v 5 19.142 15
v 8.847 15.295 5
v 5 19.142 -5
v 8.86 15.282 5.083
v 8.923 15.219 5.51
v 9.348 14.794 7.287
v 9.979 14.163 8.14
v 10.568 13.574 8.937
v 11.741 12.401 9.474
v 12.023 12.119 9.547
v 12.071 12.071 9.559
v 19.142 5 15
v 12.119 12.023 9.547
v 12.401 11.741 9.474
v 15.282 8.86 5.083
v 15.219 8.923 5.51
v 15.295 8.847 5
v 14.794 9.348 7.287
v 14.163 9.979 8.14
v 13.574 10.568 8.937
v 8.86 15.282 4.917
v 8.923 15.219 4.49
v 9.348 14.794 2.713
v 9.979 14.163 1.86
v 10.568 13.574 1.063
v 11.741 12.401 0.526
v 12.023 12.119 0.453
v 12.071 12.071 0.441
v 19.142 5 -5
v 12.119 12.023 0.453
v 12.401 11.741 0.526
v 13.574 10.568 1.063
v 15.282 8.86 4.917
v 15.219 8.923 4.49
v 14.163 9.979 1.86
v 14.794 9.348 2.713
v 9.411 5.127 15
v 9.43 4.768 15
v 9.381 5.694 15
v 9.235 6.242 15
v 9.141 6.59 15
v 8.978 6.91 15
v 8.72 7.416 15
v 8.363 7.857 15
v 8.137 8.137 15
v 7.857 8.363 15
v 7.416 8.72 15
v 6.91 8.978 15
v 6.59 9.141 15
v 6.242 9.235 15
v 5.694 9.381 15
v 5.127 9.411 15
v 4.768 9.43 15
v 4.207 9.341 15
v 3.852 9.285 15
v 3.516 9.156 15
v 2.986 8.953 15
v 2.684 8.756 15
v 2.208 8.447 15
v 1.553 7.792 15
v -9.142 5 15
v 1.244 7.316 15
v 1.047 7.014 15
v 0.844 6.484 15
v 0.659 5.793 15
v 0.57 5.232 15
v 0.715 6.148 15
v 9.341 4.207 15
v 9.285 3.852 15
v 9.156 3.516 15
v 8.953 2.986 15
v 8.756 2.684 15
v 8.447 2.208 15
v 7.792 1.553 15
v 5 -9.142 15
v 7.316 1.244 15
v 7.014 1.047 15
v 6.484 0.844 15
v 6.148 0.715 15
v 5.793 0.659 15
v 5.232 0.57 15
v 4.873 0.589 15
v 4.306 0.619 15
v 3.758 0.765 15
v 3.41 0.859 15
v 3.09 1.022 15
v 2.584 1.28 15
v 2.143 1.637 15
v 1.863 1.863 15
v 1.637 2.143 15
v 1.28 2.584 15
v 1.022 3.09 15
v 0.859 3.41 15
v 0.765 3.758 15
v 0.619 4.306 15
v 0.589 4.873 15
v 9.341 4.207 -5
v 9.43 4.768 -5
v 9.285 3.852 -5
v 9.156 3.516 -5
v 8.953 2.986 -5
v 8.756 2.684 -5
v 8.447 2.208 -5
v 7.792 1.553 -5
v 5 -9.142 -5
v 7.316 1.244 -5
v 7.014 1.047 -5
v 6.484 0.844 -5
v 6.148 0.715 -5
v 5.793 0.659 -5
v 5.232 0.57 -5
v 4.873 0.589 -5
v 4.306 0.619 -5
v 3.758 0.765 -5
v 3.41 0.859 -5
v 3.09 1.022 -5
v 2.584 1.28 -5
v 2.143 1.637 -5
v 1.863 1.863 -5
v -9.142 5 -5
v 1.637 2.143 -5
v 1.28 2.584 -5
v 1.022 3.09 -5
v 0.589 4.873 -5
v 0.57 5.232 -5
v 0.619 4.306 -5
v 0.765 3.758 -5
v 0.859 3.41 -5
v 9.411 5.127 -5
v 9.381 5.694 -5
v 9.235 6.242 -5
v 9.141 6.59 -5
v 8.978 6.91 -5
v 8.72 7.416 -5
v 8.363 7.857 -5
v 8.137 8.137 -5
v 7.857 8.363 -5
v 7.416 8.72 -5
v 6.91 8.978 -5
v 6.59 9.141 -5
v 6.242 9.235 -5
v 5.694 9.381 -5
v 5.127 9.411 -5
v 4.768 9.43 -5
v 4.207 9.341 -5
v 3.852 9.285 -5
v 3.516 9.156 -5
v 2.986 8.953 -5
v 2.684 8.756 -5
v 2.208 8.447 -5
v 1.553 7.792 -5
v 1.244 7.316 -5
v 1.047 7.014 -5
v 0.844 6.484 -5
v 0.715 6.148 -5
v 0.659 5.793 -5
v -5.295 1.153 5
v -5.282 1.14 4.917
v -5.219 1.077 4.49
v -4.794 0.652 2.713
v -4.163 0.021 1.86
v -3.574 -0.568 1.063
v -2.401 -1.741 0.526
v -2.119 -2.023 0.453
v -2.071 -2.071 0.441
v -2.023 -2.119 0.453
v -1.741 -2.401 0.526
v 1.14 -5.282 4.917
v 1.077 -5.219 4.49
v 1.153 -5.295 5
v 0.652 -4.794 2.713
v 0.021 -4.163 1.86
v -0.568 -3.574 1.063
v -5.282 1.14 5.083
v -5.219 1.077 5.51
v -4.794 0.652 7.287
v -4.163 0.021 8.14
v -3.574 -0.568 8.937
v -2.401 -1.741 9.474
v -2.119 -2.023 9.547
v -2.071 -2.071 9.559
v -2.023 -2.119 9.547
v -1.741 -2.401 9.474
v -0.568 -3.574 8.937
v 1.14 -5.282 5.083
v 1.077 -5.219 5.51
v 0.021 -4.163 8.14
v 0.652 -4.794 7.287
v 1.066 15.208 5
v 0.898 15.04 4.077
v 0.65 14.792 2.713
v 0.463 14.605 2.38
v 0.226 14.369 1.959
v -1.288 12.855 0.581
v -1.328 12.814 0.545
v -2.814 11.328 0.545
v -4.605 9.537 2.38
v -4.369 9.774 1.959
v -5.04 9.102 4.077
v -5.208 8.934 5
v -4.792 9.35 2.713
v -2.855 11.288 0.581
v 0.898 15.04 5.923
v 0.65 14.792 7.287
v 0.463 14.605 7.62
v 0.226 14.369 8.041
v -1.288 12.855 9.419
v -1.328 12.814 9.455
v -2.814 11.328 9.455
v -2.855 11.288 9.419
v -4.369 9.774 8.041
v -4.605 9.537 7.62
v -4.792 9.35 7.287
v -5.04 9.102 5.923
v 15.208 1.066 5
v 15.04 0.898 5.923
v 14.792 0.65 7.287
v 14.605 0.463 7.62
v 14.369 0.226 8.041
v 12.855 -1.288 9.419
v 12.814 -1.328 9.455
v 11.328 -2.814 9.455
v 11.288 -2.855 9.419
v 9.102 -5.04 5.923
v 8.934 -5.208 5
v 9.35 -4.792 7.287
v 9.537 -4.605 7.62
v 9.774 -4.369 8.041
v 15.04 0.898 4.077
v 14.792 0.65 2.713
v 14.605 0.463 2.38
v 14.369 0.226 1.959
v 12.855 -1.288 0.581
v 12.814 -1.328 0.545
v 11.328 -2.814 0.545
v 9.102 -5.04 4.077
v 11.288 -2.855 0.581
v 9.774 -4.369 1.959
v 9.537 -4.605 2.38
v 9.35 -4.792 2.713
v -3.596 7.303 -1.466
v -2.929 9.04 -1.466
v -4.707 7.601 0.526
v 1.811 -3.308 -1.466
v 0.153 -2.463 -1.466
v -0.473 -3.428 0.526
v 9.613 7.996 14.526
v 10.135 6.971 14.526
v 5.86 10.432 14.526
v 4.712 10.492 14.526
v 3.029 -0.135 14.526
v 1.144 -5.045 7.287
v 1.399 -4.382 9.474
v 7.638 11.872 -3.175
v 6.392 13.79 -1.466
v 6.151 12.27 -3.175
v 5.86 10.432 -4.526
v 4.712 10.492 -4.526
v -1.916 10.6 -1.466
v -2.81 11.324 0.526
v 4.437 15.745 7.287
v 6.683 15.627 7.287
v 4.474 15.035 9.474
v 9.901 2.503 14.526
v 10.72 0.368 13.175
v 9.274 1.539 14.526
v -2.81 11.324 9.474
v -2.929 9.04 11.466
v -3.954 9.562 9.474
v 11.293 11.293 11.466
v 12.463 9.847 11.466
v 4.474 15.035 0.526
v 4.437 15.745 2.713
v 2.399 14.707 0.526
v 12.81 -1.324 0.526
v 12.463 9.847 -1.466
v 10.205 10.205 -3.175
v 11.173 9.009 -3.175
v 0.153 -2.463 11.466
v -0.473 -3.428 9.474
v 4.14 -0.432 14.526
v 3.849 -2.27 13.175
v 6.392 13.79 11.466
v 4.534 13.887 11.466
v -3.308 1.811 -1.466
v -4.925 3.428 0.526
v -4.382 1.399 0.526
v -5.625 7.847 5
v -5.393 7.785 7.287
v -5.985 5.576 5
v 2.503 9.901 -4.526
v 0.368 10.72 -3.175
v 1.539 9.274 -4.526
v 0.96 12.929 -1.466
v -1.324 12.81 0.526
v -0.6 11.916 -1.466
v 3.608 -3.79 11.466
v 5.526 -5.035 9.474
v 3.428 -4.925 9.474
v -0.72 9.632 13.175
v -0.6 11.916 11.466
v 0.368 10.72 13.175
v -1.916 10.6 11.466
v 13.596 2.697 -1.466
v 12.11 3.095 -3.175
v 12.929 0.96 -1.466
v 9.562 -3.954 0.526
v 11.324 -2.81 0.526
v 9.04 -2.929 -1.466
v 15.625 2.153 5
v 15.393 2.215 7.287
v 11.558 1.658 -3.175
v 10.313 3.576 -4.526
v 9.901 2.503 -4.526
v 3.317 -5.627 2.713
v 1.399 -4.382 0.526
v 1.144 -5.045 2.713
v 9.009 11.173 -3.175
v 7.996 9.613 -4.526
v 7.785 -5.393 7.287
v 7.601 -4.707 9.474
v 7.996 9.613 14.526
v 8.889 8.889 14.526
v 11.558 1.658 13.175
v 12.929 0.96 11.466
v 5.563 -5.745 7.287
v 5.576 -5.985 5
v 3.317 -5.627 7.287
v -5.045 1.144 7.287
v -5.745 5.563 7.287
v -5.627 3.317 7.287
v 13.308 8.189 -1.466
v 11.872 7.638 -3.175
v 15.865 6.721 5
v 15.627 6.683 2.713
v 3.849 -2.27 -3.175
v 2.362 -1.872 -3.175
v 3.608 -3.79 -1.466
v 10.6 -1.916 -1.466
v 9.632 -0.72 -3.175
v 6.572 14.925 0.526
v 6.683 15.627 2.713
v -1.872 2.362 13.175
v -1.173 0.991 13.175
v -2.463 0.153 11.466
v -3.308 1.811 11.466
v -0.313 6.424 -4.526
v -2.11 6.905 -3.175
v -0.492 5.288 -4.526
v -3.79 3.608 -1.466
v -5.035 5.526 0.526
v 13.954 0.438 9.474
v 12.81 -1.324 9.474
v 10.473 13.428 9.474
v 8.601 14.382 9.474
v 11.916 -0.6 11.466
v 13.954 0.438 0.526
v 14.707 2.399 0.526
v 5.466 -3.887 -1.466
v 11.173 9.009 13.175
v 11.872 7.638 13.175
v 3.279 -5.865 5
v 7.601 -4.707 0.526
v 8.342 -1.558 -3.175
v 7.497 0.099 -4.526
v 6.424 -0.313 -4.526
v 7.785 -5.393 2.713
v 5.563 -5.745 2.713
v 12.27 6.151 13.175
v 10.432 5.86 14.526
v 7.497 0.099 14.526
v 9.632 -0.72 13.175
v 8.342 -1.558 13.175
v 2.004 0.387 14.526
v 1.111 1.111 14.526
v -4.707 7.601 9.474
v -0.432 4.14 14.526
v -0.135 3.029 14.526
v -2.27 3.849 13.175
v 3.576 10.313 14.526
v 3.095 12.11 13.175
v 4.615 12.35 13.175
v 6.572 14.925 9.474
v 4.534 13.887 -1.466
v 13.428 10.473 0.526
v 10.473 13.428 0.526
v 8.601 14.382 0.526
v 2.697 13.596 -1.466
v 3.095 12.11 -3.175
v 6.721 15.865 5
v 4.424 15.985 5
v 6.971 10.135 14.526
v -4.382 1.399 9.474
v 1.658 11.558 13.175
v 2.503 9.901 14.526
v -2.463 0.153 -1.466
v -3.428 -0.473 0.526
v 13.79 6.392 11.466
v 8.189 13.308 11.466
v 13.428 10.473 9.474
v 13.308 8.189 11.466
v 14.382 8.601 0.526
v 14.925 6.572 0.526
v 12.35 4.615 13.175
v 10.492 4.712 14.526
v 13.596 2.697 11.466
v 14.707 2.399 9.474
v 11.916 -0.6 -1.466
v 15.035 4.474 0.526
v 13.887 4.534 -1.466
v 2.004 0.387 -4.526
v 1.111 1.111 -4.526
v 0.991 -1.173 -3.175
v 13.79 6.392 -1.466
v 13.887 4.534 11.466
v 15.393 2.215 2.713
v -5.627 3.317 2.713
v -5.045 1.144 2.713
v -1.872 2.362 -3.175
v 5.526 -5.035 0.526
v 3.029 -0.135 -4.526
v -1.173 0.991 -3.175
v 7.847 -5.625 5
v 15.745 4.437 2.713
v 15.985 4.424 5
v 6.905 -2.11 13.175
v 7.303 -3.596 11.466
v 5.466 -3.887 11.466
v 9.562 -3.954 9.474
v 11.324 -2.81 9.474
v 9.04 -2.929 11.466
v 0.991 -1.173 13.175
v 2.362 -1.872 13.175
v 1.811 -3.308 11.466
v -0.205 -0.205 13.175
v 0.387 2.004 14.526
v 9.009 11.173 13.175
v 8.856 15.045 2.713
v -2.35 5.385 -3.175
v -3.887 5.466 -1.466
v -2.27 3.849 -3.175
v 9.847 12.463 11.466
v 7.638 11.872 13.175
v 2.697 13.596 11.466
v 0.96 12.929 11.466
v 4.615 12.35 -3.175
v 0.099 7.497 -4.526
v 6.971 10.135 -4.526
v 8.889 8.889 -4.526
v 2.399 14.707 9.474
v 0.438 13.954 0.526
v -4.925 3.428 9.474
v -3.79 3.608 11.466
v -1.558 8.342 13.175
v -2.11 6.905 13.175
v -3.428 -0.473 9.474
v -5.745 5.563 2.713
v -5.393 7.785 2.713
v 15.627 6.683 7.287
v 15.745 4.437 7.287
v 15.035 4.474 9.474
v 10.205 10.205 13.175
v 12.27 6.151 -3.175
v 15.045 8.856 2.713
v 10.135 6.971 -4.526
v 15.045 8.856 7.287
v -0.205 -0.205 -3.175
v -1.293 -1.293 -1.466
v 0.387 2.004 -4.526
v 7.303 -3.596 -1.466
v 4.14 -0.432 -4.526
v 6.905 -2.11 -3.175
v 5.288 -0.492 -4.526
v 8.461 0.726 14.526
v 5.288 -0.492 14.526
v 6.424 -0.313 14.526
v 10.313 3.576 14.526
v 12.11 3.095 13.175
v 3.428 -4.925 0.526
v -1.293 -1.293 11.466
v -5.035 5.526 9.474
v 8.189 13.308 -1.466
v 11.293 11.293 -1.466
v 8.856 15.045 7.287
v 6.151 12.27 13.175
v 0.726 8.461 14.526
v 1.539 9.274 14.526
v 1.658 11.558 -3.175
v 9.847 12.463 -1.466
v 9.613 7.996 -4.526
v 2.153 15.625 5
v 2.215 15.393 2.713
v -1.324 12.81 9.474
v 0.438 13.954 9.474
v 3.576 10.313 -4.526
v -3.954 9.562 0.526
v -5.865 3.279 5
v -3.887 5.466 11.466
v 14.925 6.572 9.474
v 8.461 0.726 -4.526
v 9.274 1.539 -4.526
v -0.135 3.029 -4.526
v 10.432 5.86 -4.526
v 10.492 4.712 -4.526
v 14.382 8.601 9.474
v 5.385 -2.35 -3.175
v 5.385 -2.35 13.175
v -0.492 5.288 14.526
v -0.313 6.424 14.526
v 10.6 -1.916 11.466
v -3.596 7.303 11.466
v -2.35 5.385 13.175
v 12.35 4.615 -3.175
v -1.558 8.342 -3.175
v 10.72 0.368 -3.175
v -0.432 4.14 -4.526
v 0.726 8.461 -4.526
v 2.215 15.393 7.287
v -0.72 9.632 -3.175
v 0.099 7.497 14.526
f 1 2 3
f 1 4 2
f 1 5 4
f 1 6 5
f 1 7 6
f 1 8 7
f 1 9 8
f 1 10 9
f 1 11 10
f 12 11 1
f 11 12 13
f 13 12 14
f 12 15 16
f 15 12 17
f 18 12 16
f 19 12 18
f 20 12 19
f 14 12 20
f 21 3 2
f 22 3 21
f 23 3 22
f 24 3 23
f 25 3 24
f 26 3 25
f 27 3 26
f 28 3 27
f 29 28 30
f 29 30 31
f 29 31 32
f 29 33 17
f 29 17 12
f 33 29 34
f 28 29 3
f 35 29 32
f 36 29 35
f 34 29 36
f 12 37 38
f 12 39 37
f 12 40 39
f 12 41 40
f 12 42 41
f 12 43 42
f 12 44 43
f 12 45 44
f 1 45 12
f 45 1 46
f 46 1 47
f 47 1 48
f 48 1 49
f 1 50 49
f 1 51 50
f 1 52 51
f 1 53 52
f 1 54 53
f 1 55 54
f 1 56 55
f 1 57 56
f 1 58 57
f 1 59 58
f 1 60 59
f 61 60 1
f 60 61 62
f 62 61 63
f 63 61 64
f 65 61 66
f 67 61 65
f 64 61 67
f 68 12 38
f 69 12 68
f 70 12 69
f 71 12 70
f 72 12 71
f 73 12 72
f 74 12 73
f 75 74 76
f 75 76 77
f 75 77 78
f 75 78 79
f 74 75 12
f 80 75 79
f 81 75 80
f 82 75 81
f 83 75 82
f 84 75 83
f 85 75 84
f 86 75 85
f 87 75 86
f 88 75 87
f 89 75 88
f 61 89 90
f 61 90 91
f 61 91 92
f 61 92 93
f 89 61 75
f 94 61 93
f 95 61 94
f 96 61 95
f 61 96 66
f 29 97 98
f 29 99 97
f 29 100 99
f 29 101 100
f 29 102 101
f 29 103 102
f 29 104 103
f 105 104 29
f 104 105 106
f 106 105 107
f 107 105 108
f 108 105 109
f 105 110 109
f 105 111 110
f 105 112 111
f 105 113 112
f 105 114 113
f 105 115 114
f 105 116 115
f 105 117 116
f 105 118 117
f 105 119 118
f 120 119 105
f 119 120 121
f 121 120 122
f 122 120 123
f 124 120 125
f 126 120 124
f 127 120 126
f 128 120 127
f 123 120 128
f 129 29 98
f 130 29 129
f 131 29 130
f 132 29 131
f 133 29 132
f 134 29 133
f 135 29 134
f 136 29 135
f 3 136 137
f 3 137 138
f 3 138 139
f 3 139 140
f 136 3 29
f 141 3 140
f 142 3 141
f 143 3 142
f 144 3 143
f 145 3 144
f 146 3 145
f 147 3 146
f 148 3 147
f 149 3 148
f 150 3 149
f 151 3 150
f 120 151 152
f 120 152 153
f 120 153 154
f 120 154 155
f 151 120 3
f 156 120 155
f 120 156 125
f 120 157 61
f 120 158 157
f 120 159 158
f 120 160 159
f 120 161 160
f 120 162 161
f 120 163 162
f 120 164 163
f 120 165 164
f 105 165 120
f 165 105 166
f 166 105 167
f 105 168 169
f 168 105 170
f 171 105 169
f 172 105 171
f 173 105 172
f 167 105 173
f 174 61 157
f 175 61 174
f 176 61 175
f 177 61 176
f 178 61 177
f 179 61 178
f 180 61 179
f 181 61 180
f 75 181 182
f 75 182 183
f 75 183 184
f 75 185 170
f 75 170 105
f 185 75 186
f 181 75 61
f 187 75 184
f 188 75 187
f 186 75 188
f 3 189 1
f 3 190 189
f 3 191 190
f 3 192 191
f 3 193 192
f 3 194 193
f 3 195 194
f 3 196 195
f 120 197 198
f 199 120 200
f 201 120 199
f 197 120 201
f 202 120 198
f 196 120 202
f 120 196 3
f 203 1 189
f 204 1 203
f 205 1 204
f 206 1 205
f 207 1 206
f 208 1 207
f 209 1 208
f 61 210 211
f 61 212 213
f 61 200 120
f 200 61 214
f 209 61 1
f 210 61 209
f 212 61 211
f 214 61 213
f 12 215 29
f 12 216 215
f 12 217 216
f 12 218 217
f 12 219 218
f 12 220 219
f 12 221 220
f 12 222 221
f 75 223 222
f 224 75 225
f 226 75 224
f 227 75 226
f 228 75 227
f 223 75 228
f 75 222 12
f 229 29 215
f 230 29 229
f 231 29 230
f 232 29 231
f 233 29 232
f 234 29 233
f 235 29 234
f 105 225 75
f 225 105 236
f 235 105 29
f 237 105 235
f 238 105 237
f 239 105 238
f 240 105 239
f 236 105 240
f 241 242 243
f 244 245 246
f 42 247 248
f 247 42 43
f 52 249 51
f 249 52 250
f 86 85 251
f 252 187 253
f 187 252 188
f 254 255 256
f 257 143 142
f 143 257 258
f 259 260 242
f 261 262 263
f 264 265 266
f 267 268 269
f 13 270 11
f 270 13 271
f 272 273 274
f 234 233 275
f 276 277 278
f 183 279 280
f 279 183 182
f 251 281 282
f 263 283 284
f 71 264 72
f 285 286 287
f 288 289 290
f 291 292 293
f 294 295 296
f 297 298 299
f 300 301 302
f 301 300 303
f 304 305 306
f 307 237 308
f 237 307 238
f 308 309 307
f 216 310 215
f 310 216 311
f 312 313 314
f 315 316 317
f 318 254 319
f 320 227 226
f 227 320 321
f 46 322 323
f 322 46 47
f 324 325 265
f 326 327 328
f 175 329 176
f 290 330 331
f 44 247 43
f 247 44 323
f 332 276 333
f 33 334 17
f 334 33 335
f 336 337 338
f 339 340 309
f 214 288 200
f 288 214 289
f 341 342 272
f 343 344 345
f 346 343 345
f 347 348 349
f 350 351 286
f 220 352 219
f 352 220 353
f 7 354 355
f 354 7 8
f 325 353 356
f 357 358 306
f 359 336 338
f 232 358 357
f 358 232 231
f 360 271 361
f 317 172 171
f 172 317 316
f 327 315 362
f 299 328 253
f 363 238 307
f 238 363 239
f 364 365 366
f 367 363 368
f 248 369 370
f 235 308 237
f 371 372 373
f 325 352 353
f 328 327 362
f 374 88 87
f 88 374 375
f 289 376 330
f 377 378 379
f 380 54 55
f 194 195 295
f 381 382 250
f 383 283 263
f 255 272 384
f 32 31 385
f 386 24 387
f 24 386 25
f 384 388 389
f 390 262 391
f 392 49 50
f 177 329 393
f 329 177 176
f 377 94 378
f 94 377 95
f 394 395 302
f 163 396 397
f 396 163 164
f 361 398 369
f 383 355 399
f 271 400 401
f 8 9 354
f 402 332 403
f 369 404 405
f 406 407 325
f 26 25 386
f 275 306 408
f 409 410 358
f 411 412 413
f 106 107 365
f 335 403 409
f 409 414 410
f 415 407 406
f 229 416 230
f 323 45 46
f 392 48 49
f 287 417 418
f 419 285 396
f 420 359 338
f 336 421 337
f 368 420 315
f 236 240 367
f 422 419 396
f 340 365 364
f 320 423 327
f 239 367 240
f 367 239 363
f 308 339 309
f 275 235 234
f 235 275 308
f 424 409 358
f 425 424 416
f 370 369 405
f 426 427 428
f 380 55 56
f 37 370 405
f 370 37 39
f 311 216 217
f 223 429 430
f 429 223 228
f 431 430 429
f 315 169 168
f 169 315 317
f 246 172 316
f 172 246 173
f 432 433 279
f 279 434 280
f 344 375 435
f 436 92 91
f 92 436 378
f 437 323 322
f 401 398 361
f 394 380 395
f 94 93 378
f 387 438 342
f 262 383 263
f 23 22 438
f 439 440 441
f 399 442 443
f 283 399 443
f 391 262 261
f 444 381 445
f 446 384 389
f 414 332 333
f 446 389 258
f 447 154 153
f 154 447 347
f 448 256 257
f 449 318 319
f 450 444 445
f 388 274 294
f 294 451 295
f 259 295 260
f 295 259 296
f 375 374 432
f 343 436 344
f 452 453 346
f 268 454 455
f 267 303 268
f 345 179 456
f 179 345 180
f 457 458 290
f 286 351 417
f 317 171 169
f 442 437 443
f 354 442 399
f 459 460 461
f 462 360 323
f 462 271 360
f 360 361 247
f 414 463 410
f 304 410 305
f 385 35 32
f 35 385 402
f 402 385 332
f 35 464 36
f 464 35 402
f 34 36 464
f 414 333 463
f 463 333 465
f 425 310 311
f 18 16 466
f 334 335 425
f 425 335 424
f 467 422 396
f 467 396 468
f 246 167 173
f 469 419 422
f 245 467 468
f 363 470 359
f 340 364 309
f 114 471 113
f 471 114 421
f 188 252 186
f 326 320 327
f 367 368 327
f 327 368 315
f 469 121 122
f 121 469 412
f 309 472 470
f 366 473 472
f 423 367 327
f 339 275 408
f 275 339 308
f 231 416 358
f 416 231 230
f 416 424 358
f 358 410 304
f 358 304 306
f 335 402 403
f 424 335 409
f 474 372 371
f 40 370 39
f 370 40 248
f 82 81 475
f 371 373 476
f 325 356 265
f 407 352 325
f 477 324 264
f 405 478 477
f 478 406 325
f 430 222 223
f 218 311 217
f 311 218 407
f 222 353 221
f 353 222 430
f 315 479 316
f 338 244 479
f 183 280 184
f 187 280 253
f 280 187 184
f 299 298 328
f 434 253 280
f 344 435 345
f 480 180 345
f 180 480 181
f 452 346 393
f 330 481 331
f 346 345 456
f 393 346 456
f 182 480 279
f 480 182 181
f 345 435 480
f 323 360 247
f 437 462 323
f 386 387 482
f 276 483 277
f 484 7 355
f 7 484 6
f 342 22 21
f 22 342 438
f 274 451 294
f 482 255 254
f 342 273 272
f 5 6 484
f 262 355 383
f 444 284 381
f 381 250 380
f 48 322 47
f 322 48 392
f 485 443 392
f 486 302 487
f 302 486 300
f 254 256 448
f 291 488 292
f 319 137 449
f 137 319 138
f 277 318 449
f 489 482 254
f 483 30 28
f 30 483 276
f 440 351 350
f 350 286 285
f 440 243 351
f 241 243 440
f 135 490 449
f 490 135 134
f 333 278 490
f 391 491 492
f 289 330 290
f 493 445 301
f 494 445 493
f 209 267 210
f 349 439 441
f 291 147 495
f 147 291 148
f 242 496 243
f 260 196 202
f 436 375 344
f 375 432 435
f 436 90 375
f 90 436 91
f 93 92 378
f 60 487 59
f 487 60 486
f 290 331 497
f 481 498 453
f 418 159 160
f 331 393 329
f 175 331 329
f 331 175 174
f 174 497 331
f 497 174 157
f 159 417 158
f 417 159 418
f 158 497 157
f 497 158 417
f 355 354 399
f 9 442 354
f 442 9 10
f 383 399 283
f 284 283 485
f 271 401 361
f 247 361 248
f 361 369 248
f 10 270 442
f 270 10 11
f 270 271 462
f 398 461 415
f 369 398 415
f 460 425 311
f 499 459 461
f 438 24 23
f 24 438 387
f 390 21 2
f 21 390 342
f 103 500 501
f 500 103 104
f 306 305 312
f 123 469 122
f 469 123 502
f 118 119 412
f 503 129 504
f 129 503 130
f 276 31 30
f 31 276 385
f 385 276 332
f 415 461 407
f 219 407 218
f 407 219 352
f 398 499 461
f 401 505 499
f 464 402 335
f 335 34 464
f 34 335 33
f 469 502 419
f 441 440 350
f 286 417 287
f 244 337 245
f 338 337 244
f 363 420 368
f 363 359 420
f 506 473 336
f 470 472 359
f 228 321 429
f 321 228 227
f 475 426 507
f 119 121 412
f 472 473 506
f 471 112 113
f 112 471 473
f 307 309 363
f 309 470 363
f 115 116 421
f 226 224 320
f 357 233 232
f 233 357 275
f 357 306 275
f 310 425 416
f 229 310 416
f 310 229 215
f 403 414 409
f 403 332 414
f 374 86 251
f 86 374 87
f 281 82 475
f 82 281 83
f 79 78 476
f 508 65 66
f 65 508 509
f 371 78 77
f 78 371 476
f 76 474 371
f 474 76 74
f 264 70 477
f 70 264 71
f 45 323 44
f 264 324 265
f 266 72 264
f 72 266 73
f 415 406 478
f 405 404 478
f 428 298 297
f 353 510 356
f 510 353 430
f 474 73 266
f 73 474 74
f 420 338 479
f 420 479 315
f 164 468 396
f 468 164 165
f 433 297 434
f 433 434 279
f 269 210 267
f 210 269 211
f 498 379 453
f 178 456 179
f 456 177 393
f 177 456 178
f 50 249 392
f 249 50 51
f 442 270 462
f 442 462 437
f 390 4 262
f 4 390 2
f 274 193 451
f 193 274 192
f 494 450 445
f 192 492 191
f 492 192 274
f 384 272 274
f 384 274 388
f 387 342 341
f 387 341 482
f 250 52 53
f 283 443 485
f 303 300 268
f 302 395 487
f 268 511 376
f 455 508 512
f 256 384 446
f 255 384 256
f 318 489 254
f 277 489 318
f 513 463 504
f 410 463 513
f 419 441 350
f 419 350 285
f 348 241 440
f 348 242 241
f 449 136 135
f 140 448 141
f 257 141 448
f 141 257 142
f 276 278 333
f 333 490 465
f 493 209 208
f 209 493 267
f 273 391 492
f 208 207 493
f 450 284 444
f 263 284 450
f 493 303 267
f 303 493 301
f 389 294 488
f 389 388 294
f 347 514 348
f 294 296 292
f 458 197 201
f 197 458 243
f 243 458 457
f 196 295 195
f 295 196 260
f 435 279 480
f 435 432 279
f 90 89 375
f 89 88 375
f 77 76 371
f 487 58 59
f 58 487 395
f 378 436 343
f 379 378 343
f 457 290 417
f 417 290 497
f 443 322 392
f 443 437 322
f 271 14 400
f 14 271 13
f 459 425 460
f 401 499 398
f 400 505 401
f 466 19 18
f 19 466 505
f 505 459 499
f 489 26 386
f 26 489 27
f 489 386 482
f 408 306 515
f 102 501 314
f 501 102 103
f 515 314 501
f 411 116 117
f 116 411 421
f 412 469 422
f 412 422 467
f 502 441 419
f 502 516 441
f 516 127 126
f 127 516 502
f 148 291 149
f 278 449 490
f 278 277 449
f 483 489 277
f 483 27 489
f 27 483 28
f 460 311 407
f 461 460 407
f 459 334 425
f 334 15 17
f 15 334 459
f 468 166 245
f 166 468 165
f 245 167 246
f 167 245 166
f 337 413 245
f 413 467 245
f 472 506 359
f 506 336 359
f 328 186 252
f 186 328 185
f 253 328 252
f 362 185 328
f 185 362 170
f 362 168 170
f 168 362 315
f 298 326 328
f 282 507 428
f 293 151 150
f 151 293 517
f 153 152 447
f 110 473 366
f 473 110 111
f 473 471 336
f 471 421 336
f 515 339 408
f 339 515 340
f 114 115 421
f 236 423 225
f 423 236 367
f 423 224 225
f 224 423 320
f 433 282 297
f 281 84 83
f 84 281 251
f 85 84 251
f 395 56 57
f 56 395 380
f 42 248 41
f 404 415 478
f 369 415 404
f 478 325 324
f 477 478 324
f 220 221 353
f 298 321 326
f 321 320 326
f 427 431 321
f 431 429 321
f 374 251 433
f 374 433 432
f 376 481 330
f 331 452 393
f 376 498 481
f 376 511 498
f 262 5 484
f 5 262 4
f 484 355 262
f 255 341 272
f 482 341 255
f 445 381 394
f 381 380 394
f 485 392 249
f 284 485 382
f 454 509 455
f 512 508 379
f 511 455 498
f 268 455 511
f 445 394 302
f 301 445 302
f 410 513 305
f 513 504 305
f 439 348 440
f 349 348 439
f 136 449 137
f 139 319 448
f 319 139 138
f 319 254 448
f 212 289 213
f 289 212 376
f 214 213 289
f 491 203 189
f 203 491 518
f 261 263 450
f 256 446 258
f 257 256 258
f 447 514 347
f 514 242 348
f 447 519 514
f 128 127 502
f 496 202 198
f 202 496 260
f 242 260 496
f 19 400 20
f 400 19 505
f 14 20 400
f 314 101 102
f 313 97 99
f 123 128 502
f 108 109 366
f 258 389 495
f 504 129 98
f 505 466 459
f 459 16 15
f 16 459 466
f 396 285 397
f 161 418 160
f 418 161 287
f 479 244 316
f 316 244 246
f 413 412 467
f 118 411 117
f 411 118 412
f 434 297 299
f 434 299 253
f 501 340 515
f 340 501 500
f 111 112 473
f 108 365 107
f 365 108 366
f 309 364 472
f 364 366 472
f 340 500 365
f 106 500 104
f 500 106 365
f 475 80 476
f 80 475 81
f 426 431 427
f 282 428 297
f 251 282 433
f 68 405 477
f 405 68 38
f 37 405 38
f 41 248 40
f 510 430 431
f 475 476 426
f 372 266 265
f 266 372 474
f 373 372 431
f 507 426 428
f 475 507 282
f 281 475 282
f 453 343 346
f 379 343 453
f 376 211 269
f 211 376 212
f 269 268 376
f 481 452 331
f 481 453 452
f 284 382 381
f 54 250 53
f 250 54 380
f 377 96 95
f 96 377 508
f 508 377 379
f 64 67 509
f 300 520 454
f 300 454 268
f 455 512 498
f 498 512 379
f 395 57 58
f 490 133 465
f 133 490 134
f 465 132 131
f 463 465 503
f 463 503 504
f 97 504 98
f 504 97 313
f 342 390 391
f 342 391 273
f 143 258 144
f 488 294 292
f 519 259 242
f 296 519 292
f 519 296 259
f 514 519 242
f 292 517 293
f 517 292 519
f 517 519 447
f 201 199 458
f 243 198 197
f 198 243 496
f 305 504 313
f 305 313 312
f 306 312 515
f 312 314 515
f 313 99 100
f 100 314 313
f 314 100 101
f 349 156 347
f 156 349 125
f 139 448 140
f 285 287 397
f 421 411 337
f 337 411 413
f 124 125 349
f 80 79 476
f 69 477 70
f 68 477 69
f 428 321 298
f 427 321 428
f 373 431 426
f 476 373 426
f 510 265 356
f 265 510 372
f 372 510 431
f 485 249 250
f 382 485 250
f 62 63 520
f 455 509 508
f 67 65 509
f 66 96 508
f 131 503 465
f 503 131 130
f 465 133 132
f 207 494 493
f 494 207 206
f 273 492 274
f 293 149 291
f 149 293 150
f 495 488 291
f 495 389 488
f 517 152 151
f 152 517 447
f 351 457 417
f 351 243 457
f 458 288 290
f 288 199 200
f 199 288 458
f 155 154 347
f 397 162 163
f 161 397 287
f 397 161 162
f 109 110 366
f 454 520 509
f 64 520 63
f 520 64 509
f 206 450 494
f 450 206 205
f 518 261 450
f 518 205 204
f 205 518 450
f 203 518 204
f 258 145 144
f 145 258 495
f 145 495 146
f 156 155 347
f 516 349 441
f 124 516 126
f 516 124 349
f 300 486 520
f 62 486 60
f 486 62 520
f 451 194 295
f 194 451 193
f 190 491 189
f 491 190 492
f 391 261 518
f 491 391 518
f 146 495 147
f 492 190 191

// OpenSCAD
translate([5, 5, 5]) rotate([0, 0, 45]) difference() {
    cube([20, 20, 20], center = true);
    translate([0, 0, 0]) sphere(r = 11);
}
